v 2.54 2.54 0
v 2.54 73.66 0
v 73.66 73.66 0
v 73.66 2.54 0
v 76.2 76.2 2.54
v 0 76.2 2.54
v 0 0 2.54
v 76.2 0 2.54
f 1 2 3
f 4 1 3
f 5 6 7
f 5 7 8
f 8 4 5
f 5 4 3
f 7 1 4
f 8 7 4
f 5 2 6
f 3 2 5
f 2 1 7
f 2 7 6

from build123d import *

# Parameters (mm, degrees)
F0_W     = 76.2
F0_H     = 76.2
F1_DEPTH = 2.54
F2_SIZE  = 2.53999


# Not quite as in the source:
# - a fillet or chamfer is up to 0.001 mm smaller than in the source, because OpenCascade refuses the exact size


with BuildPart() as f1:
    # F0 (on Top) → F1 (new body)
    with BuildSketch(Plane.XY):
        with Locations((38.1, 38.1)):
            Rectangle(F0_W, F0_H)
    extrude(amount=F1_DEPTH)

    # F2 (size 2.54 in the source; OpenCascade refuses exactly that, so slightly less here)
    f2_edges = [f1.edges().sort_by_distance(p)[0] for p in [
        (0, 38.1, 0),
        (38.1, 0, 0),
        (76.2, 38.1, 0),
        (38.1, 76.2, 0),
    ]]
    chamfer(f2_edges, length=F2_SIZE)


solid = f1.part
